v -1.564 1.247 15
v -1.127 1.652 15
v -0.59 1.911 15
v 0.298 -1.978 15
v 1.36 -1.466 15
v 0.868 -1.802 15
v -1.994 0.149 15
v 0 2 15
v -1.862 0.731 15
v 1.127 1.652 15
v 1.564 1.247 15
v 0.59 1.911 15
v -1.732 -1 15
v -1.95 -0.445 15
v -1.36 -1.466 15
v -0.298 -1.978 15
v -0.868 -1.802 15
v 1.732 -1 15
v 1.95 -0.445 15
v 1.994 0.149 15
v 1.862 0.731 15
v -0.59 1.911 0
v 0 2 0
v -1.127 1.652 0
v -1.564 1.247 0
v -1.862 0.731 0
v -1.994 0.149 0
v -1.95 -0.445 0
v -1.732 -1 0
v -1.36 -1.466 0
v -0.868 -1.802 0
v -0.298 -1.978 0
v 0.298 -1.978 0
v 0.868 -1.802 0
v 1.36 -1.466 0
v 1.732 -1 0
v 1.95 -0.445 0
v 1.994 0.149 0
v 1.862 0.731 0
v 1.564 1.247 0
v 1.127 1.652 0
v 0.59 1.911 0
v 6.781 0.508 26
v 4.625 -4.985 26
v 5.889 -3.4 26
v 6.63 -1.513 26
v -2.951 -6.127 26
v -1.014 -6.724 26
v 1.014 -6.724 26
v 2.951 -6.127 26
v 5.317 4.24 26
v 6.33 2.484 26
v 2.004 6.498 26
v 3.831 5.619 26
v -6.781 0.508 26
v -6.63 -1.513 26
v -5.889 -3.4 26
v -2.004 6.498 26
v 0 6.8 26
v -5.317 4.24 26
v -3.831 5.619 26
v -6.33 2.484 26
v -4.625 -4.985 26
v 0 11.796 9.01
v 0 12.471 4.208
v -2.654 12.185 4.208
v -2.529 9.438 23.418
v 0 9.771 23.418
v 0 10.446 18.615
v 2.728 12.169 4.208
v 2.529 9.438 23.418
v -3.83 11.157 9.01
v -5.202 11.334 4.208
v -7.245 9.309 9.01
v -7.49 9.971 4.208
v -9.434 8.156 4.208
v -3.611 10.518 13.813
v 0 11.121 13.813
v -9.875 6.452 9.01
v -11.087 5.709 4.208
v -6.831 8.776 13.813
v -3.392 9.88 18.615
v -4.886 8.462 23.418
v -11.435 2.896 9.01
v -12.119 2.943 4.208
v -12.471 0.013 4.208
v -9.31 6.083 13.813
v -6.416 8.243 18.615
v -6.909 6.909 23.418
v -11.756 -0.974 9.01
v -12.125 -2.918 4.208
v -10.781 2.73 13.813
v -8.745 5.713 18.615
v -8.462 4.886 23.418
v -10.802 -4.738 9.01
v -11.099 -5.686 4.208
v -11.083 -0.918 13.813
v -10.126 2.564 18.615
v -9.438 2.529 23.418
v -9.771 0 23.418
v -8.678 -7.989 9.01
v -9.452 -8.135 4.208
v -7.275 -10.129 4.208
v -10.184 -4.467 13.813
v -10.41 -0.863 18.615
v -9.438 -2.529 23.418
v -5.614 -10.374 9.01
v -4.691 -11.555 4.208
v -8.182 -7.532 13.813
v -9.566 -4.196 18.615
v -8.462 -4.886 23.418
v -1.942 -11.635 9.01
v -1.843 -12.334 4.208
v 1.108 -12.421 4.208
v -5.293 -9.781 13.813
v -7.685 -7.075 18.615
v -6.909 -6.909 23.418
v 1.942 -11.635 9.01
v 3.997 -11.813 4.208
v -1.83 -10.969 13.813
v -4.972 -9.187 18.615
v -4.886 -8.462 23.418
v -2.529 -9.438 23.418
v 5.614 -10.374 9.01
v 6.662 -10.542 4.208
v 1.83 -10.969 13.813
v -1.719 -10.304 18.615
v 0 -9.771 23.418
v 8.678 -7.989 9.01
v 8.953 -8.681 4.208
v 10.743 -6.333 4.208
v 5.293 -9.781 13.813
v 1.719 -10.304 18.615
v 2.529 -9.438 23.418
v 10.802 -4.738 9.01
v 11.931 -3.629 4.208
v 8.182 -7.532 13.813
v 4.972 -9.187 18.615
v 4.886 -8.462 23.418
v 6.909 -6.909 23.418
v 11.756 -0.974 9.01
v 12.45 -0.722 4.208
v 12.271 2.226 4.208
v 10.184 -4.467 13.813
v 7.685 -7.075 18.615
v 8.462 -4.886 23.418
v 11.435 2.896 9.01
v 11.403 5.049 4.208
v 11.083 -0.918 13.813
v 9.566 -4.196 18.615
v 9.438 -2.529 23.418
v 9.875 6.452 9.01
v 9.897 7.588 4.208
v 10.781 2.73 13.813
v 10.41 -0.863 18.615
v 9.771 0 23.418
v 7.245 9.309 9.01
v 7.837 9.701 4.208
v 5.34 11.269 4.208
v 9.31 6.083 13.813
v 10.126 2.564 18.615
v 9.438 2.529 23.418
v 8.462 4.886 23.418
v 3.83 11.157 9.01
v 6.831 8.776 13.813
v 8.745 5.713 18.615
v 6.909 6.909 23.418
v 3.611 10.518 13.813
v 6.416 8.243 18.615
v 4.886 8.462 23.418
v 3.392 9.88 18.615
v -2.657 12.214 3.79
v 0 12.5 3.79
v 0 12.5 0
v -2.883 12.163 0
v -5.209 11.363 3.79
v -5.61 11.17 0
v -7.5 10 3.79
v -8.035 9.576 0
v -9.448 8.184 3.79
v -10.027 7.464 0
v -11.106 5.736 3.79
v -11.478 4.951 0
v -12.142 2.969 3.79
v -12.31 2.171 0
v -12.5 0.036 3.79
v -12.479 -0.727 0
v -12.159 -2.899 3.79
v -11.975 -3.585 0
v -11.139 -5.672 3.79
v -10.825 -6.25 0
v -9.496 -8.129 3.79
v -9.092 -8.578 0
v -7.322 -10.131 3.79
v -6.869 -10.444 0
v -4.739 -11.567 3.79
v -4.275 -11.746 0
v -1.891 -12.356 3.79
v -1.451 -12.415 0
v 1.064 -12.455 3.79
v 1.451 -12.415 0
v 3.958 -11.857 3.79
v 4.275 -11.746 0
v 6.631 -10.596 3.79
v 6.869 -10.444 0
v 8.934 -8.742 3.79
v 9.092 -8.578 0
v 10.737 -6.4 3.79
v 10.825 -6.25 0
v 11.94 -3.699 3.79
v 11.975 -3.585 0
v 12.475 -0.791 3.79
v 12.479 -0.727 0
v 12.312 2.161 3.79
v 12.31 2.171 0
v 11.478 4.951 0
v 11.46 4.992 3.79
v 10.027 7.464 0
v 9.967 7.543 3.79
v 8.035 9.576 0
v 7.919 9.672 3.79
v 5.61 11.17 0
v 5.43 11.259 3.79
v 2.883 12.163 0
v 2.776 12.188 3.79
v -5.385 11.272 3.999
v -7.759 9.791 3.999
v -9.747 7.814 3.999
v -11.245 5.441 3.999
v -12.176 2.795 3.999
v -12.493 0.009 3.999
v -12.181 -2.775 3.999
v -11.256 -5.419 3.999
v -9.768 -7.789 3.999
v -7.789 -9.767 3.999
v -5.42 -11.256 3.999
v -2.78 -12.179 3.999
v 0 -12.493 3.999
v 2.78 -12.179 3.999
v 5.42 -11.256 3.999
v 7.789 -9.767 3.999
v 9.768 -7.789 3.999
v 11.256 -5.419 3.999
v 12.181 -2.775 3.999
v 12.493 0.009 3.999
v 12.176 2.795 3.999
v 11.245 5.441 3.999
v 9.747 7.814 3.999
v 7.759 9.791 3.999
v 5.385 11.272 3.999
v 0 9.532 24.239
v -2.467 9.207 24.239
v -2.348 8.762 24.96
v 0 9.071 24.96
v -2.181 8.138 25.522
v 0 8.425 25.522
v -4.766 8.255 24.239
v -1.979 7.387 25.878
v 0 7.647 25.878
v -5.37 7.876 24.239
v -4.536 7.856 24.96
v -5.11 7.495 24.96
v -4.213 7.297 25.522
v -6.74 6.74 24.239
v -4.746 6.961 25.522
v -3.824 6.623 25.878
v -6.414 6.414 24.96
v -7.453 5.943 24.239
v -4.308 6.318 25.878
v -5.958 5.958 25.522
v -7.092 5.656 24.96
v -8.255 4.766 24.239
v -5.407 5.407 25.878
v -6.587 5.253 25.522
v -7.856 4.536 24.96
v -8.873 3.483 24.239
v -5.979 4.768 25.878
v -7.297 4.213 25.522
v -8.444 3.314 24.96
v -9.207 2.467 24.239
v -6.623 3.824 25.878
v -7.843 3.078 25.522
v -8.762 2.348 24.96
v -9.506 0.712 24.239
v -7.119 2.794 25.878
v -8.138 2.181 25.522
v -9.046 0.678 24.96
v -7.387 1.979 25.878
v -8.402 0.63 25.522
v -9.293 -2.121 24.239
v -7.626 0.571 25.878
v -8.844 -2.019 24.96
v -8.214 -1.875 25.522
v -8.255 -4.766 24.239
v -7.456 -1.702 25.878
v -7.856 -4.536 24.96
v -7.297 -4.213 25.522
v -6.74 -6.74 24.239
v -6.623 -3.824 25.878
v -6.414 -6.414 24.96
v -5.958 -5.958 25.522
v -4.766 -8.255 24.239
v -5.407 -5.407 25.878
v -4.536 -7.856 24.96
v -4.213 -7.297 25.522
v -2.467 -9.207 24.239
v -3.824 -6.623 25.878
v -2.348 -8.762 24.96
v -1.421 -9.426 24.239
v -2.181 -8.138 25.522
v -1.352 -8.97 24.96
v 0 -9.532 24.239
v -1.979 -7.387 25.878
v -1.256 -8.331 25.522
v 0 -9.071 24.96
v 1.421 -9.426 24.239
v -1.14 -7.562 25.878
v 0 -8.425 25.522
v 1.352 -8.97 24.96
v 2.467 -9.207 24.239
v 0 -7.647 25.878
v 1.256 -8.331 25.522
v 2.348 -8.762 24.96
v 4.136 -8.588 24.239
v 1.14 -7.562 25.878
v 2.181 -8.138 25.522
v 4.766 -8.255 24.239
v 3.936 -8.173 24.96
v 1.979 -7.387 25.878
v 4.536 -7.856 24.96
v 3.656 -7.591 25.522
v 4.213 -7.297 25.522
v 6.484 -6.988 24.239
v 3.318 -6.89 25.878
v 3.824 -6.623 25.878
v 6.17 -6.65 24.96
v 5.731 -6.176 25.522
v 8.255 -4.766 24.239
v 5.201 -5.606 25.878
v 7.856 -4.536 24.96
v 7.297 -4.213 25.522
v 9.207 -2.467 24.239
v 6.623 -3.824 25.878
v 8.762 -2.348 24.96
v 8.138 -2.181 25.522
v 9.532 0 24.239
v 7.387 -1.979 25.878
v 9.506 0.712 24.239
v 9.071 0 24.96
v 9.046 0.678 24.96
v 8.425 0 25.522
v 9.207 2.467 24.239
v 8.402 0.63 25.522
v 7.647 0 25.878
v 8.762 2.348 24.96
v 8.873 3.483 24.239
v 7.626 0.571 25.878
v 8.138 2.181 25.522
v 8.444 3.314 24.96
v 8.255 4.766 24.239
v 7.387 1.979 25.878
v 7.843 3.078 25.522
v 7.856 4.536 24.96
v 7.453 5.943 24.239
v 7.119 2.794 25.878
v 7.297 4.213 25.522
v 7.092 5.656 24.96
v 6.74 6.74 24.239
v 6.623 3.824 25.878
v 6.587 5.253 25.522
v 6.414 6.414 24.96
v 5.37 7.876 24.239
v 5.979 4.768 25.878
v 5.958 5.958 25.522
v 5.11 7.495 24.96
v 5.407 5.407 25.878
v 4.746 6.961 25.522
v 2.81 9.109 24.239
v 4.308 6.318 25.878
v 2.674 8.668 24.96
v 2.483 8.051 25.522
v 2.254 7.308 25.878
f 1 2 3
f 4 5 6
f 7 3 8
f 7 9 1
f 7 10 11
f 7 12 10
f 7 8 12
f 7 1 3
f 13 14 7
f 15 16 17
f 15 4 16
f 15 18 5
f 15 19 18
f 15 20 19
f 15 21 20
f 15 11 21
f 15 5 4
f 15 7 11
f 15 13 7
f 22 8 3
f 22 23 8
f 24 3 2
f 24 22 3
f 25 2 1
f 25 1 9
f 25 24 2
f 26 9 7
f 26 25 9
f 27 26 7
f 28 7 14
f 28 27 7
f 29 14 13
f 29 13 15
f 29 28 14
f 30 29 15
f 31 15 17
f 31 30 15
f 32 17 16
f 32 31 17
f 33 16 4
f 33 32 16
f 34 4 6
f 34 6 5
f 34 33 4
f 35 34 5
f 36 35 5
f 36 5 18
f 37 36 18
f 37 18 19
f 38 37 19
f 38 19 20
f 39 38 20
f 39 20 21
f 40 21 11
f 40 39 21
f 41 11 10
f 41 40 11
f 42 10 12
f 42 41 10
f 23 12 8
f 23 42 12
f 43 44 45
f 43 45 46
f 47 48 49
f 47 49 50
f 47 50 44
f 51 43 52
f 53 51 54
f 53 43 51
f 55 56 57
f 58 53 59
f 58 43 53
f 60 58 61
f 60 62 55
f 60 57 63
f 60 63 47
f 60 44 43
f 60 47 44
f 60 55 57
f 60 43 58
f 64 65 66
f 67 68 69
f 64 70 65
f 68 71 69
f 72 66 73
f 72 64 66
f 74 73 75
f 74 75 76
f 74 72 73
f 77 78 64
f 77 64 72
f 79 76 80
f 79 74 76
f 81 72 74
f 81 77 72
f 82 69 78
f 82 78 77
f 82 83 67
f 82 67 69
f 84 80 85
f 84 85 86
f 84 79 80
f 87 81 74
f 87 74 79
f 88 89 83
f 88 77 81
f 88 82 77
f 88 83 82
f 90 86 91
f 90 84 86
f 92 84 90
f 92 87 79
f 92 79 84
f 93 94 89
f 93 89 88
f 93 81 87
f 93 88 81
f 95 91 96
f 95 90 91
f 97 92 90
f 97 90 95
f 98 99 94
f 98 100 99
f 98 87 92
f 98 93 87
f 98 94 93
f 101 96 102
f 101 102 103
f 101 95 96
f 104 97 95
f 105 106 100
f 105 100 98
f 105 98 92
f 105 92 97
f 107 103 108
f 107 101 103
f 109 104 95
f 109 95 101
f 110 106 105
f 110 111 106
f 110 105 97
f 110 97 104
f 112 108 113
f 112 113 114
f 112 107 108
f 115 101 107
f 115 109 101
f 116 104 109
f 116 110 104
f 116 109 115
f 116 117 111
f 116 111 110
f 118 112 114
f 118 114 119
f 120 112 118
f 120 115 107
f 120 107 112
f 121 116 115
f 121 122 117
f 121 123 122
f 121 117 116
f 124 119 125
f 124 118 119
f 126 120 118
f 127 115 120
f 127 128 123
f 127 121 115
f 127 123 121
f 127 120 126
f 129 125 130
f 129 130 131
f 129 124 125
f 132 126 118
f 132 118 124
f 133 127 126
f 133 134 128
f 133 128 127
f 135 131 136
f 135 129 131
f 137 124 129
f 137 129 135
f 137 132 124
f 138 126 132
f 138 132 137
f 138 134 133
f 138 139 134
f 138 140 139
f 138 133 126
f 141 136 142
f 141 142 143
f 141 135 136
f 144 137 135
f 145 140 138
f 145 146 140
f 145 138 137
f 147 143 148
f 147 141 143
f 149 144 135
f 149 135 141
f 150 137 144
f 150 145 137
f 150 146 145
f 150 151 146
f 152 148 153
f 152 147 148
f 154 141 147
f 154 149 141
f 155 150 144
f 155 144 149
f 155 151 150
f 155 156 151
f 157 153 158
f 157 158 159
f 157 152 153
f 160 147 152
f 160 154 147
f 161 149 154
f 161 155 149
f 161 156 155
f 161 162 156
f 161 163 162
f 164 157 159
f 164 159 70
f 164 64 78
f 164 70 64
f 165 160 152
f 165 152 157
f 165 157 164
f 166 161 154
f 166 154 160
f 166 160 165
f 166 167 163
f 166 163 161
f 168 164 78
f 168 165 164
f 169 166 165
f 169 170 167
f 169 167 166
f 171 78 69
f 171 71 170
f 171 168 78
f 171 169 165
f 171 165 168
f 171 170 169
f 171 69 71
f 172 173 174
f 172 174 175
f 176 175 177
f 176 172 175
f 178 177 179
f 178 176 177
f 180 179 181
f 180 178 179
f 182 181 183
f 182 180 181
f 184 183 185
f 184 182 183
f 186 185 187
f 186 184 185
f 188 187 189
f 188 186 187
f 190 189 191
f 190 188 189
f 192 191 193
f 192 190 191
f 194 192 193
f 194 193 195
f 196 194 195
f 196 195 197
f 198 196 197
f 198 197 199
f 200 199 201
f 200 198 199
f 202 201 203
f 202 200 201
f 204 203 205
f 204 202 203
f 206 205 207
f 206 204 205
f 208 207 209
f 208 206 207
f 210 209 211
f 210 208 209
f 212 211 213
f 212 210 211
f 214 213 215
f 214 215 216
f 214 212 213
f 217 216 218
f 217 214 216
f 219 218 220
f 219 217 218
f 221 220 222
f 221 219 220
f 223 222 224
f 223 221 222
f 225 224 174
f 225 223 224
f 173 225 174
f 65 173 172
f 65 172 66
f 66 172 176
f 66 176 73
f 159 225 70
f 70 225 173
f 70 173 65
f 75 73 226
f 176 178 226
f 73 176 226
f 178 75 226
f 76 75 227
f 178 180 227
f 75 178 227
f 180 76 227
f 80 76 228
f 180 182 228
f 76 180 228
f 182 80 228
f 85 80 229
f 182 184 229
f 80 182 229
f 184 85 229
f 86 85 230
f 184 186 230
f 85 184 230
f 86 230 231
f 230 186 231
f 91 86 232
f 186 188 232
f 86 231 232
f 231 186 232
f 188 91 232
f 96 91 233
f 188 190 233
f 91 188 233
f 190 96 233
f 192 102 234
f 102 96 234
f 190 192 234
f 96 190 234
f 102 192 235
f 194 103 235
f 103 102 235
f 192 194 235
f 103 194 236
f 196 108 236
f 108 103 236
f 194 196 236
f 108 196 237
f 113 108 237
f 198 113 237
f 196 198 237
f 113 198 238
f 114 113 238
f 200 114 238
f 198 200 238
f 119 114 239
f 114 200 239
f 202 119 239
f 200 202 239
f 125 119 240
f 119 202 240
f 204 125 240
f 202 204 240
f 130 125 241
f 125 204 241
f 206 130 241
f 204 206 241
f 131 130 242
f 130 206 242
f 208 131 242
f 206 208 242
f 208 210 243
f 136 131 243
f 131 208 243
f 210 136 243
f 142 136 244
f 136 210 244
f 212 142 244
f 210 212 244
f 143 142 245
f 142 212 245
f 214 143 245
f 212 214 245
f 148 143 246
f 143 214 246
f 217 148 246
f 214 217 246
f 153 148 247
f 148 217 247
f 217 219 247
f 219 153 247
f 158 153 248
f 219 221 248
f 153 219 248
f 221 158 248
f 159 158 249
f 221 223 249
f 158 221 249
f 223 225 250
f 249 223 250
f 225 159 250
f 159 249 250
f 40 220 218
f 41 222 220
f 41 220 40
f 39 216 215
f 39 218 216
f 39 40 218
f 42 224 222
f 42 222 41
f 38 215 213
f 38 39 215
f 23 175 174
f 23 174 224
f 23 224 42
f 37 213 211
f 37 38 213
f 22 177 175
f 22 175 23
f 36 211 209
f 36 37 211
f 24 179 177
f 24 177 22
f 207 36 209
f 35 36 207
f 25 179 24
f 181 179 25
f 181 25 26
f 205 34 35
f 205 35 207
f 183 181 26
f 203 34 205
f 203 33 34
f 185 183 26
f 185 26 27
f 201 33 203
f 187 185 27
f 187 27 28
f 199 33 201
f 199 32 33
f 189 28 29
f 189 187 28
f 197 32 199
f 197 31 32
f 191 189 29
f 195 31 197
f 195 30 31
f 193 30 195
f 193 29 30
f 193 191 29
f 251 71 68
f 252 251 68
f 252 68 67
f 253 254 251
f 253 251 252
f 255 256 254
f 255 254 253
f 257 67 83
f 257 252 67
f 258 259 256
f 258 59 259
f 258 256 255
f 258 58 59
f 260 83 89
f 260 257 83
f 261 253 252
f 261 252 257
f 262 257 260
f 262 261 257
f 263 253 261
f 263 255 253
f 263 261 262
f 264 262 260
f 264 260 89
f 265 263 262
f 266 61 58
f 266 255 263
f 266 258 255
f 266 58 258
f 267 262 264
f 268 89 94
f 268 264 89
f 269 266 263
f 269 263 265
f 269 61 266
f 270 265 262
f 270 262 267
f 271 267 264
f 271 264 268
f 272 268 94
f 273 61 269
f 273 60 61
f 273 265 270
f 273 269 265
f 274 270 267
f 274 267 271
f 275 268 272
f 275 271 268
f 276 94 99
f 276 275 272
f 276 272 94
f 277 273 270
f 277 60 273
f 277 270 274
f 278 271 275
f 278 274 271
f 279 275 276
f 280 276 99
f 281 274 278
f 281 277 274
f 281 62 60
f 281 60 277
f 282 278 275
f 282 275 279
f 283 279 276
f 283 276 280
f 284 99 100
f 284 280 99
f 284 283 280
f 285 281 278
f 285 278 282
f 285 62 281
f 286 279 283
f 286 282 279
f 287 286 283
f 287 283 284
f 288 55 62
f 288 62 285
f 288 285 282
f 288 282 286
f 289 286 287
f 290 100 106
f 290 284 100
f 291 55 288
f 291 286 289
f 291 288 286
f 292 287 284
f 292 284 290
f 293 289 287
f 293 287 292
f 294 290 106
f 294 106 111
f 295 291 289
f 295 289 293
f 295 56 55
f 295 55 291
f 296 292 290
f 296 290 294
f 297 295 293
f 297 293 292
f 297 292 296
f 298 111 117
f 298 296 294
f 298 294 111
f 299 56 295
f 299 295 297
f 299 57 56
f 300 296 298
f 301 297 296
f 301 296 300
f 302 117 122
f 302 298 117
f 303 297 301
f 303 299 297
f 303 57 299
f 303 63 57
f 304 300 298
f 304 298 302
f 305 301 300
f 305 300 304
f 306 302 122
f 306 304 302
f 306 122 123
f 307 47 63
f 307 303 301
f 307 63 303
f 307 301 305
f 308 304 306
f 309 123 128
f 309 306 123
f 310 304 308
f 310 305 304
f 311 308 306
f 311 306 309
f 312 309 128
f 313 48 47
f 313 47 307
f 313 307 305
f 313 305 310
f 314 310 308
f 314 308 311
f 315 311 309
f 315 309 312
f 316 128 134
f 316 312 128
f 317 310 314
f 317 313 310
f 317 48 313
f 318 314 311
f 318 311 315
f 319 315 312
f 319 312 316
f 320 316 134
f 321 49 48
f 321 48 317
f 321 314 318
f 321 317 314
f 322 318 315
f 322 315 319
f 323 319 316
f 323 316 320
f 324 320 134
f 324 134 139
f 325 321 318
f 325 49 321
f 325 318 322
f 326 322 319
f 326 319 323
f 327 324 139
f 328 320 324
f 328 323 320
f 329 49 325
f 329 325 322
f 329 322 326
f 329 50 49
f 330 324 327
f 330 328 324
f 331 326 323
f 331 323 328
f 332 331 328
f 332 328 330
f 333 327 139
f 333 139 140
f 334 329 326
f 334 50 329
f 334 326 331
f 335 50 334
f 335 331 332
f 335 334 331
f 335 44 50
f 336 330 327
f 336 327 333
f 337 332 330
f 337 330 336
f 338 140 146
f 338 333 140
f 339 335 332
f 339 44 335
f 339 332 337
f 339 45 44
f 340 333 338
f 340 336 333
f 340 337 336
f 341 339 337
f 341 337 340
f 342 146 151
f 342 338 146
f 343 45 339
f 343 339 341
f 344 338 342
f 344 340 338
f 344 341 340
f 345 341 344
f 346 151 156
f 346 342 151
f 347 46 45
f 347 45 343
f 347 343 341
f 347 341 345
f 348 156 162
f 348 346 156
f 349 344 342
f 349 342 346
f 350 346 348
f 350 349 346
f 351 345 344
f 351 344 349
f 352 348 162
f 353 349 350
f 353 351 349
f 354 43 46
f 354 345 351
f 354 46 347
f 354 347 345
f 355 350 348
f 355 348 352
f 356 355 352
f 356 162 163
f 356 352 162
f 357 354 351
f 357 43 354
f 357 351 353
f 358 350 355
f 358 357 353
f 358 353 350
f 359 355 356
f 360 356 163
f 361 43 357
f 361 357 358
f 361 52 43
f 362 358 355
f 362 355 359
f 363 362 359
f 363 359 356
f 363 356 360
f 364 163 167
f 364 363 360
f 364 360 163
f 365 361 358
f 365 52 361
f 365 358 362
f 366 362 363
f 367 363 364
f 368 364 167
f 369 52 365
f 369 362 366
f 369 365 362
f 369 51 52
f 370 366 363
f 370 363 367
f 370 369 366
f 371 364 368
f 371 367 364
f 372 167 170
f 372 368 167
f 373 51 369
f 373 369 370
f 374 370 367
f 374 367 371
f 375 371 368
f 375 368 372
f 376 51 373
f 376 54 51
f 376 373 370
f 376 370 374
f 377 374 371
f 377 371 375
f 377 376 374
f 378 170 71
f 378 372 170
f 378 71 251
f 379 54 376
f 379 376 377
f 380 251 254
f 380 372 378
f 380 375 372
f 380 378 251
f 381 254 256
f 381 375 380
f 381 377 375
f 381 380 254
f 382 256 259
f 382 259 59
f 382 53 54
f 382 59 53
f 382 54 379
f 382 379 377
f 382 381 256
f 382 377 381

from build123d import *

# Parameters (mm, degrees)
FILLET1_R = 3


with BuildPart() as part:
    # Sketch1 → Revolve1 (revolve)
    with BuildSketch(Plane(origin=(0, 0, 0), x_dir=(0, 0, -1), z_dir=(1, 0, 0))):
        Polygon((-26, 0), (-15, 0), (-15, 2), (0, 2), (0, 12.5), (-4, 12.5), (-26, 9.408101637), align=None)
    revolve(axis=Axis((0, 0, 0), (0, 0, 1)))

    # Fillet1
    fillet1_edges = [part.edges().sort_by_distance(p)[0] for p in [
        (0, -9.408101637, 26),
        (0, -12.5, 4),
    ]]
    fillet(fillet1_edges, radius=FILLET1_R)


solid = part.part
